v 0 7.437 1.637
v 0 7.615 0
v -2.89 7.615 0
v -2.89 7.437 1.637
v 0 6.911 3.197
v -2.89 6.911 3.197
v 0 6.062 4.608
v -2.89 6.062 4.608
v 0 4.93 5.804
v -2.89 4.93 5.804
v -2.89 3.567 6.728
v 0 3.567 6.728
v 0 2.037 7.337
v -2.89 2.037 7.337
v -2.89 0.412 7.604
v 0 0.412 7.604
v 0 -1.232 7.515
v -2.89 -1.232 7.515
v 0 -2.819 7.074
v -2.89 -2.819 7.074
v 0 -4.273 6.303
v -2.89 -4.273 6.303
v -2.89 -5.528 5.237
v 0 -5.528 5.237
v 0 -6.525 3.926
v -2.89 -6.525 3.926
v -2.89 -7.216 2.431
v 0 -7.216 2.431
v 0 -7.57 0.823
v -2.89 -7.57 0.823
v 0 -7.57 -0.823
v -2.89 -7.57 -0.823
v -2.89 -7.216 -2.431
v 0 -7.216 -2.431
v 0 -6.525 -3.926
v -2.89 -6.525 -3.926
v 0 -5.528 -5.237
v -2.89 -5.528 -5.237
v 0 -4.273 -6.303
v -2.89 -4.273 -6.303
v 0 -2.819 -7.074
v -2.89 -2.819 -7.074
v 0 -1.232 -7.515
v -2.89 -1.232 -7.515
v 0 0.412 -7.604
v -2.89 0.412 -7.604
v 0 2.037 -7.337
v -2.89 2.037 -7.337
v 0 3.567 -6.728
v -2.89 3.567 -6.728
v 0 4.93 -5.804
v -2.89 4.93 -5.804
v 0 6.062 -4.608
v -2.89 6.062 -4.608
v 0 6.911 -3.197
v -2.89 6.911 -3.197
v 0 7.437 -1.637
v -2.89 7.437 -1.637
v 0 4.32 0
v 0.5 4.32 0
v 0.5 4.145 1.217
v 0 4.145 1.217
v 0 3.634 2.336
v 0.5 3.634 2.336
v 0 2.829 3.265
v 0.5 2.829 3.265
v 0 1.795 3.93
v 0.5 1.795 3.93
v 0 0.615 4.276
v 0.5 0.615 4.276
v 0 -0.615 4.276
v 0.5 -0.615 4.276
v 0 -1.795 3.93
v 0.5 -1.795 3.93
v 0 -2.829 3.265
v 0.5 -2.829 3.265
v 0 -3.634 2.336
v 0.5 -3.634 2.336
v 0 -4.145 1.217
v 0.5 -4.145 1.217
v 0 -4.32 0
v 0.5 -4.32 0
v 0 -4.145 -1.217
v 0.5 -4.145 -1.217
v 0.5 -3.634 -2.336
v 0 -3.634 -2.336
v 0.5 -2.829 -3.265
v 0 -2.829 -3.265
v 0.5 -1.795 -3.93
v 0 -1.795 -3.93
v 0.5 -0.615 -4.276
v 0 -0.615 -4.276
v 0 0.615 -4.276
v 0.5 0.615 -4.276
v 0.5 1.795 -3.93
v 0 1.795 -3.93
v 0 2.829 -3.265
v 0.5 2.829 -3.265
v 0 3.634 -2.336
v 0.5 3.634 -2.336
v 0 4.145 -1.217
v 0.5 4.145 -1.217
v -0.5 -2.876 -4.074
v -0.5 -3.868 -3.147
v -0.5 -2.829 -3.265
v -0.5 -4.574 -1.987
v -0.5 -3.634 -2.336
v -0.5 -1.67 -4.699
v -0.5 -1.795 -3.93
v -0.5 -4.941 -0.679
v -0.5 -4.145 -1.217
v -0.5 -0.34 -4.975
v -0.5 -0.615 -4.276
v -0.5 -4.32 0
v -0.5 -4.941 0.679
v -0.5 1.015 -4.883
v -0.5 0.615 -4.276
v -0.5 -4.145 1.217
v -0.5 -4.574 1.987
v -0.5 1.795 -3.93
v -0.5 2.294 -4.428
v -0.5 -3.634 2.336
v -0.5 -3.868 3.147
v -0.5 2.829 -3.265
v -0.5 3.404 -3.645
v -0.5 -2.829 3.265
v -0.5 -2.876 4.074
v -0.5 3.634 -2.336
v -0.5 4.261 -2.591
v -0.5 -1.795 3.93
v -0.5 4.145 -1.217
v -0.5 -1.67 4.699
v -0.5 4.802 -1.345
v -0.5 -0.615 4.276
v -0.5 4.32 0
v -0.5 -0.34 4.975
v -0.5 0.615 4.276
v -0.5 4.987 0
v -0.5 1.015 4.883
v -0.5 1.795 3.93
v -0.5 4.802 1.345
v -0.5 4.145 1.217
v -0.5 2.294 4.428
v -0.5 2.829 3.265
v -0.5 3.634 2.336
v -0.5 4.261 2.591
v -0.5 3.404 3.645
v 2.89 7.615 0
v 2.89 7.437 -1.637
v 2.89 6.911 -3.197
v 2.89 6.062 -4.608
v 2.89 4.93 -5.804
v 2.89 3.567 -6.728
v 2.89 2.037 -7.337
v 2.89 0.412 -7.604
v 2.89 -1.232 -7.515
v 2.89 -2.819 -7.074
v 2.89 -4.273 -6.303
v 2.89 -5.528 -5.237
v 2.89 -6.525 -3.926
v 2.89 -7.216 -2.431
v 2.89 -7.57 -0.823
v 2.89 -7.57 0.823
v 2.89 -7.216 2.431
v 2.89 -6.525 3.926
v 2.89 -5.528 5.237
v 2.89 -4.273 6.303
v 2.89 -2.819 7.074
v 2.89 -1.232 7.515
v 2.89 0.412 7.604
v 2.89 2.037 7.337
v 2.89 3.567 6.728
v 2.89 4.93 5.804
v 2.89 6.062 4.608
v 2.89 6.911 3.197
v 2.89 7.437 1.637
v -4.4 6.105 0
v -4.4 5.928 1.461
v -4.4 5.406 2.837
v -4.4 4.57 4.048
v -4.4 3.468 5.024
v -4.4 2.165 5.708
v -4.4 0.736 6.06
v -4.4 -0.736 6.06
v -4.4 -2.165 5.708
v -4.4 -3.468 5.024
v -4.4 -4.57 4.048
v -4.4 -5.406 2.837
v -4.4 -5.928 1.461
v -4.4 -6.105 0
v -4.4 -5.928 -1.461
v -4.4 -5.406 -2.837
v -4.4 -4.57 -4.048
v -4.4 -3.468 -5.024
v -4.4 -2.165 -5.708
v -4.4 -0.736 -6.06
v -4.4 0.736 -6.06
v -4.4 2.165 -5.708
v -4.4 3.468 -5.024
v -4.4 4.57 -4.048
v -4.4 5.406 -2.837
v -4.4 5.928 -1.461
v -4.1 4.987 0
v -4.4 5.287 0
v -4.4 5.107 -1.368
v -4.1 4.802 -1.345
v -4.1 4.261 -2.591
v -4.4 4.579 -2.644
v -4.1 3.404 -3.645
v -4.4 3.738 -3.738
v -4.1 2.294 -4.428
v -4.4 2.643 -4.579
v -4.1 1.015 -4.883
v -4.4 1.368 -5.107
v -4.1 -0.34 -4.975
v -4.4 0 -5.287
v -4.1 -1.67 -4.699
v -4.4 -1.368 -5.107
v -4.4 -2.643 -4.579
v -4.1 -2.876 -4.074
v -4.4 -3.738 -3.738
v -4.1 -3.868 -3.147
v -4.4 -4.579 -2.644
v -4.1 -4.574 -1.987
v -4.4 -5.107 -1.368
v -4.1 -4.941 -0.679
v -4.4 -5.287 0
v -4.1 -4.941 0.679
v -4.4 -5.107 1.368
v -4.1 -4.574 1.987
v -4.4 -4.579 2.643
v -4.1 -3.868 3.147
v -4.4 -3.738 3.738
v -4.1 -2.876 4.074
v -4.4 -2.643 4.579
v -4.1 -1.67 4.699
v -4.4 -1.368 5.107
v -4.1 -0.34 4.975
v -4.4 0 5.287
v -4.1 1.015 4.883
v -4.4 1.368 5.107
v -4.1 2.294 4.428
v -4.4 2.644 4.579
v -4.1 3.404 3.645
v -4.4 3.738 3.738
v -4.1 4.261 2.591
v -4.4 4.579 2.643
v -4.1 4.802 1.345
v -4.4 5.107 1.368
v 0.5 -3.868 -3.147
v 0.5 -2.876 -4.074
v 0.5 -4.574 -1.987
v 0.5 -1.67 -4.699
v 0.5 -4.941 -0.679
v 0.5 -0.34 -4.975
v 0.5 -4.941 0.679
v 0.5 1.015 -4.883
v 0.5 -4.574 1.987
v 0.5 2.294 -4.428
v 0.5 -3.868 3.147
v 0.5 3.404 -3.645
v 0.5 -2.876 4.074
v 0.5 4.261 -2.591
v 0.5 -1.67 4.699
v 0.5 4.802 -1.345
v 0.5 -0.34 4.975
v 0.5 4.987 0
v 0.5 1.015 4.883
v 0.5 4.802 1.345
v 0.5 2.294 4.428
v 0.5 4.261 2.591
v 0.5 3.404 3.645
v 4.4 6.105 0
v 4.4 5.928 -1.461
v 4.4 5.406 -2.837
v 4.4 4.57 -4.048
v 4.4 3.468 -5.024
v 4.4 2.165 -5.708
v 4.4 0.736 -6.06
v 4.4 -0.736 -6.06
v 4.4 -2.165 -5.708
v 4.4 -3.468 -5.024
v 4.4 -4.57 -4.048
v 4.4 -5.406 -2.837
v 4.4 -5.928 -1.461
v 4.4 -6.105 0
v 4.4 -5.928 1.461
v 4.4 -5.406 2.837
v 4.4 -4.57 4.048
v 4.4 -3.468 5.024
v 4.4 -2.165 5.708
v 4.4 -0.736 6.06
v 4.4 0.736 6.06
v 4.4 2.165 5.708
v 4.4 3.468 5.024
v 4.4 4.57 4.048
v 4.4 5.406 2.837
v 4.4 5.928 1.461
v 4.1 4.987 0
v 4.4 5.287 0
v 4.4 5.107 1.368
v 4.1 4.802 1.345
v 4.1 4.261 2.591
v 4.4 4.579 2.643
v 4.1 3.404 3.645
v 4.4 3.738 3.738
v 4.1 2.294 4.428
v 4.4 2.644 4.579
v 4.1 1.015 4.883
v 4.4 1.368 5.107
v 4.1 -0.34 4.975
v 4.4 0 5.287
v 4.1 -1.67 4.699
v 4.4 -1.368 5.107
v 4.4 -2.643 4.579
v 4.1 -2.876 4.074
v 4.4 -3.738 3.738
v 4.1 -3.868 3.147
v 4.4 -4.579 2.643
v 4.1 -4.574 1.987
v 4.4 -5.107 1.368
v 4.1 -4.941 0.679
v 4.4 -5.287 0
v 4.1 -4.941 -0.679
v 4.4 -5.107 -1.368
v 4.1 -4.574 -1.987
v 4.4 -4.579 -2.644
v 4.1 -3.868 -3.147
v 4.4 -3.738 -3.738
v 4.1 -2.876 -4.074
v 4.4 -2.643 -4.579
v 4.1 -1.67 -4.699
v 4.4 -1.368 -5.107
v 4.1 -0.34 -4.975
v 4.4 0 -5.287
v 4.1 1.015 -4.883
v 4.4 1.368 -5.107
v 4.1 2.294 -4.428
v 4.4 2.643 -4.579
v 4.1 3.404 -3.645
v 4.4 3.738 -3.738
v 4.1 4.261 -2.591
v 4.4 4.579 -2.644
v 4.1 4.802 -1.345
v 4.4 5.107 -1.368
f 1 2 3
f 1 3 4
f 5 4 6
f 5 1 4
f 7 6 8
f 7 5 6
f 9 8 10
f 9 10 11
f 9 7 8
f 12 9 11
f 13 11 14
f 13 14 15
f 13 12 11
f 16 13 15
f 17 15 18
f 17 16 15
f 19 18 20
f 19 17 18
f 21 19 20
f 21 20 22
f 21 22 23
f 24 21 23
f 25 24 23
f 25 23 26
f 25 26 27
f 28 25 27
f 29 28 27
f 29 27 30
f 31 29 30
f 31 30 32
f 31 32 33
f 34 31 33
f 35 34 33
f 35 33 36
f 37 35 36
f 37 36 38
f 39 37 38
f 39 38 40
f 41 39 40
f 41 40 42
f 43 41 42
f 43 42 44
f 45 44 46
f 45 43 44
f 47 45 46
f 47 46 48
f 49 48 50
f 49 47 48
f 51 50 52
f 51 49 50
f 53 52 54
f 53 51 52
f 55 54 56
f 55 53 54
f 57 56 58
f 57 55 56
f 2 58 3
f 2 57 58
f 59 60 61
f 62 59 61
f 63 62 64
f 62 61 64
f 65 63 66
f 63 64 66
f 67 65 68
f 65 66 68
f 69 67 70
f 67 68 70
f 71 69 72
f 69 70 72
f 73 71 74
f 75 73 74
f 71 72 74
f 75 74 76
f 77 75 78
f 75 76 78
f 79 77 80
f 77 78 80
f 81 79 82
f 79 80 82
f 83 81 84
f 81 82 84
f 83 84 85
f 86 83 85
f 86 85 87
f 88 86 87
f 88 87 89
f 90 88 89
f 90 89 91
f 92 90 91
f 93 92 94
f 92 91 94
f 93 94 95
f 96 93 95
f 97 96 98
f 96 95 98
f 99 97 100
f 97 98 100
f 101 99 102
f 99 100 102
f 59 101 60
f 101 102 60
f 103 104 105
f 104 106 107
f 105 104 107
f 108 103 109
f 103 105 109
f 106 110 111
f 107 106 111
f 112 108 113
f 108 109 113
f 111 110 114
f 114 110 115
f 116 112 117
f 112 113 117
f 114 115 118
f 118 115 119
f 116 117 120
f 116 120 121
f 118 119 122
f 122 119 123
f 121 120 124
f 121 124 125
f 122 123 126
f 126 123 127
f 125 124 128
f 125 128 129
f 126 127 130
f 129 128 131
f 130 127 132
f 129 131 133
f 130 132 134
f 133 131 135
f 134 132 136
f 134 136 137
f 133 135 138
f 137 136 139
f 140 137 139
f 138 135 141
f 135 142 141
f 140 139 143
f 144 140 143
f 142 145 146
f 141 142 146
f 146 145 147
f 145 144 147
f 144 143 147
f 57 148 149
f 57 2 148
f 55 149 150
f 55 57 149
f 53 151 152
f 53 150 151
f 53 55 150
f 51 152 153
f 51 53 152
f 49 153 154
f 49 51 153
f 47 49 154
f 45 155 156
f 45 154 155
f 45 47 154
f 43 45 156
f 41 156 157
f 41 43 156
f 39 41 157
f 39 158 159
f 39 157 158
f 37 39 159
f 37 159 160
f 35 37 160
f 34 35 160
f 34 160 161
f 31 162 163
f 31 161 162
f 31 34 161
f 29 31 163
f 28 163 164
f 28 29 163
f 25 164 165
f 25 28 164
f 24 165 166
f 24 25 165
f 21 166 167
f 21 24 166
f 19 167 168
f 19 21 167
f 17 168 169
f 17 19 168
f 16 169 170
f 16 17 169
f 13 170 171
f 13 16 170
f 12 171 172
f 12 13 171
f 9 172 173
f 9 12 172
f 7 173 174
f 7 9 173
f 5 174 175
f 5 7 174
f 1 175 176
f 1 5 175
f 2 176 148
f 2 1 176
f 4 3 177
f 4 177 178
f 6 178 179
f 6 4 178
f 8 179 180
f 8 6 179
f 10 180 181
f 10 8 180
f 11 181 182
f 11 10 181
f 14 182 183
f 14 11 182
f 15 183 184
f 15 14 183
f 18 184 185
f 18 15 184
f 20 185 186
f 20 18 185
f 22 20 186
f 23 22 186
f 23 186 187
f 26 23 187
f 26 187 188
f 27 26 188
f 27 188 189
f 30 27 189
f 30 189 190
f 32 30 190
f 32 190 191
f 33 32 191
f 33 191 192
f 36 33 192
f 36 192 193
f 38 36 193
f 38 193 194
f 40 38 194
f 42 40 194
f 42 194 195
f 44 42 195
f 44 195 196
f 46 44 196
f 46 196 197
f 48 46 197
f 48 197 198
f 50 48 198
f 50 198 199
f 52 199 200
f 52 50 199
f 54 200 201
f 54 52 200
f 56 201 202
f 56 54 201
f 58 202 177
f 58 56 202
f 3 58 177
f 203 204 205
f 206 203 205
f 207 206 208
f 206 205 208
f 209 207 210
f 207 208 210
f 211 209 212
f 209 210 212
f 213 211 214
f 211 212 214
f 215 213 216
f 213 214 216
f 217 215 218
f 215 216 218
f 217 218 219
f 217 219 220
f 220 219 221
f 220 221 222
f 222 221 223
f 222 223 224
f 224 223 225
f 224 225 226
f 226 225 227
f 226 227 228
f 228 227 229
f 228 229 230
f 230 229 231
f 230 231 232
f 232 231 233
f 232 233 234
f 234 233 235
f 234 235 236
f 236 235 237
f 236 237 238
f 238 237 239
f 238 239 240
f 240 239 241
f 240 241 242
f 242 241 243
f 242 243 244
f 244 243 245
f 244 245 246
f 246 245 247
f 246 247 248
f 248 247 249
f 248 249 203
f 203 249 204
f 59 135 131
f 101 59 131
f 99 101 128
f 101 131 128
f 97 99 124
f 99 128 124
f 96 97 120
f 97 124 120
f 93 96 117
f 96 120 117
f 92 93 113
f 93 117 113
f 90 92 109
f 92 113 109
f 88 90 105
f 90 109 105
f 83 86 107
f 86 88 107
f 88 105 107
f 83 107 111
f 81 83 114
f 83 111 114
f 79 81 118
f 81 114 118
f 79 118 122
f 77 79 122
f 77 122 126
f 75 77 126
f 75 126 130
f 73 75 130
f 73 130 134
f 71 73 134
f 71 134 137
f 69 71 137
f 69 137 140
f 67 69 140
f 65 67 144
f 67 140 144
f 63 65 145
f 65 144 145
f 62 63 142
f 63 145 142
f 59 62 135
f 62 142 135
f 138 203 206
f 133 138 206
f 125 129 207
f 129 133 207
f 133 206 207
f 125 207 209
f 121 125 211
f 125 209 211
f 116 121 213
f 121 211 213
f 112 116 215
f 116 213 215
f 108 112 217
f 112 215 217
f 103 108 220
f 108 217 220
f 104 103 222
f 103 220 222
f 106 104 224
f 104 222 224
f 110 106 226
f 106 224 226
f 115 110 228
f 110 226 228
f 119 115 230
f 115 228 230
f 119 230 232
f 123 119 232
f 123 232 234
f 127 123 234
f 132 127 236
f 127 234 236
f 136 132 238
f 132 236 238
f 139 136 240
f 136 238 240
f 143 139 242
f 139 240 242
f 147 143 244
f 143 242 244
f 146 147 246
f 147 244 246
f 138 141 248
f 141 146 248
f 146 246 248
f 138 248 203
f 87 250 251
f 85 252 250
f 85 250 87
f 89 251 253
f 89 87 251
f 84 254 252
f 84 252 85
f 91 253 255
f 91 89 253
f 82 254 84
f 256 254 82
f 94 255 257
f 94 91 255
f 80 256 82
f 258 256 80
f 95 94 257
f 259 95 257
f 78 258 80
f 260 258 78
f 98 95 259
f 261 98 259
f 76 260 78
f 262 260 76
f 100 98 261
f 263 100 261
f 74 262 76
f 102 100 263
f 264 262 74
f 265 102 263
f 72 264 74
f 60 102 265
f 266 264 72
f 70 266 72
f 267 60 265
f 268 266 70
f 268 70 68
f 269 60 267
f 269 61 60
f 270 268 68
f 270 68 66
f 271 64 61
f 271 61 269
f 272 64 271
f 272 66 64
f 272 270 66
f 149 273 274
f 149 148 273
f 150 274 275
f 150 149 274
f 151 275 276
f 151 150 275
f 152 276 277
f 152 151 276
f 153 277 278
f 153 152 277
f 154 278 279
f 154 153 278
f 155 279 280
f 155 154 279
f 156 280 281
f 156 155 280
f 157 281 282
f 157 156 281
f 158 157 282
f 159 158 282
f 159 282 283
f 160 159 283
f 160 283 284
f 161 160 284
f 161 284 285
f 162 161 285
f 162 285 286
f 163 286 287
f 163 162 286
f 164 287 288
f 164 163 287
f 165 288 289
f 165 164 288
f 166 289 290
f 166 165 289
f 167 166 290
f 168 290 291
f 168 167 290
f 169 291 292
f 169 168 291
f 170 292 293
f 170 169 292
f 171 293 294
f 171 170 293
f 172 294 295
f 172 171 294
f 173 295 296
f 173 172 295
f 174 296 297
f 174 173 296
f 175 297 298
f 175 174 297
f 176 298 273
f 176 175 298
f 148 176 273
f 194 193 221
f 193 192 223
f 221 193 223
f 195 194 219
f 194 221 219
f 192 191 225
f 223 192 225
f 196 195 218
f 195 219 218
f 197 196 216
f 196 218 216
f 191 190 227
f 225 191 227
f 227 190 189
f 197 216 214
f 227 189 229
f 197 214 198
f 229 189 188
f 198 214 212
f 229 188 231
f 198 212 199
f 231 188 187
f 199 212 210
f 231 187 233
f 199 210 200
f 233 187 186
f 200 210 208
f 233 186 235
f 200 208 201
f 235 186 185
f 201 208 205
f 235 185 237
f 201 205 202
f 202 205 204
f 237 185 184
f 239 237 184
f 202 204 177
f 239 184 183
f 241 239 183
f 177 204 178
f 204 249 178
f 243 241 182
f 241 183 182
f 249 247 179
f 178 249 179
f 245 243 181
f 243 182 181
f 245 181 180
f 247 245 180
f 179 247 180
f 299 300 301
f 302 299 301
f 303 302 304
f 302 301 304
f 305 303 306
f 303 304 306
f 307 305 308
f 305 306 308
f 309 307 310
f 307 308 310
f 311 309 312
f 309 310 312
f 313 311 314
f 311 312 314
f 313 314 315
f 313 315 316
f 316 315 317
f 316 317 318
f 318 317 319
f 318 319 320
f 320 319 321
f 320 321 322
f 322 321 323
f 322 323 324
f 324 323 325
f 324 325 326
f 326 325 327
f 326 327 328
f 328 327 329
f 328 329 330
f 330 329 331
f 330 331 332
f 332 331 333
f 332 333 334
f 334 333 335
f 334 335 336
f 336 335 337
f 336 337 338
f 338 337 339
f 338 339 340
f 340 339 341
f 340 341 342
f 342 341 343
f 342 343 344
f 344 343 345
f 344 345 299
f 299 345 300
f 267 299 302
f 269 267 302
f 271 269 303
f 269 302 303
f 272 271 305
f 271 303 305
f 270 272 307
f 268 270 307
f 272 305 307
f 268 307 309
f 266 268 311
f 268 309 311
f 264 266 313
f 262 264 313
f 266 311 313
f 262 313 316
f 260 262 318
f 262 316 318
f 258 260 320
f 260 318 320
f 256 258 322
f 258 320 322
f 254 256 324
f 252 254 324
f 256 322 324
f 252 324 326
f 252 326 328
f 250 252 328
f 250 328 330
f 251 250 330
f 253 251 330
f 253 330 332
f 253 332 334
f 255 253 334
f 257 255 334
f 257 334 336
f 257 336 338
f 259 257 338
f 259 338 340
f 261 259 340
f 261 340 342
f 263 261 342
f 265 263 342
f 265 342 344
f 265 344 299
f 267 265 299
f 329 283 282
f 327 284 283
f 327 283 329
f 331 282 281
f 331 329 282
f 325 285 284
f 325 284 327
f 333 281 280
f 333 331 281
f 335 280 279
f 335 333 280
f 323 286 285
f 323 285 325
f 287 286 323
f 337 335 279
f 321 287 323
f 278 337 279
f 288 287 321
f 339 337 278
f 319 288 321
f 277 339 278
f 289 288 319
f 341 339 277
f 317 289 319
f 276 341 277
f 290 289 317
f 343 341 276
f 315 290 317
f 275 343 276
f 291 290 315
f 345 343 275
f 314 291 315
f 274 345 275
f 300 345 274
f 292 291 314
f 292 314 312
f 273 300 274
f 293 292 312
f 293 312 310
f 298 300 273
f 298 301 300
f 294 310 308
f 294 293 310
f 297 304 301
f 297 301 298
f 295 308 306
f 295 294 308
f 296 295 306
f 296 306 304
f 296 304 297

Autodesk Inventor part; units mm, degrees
ref_plane "YZ Plane" through (0, 0, 0) normal (1, 0, 0) x (0, 1, 0)
ref_plane "XZ Plane" through (0, 0, 0) normal (0, 1, 0) x (-1, 0, 0)
ref_plane "XY Plane" through (0, 0, 0) normal (0, 0, 1) x (1, 0, 0)
sketch "Sketch1" plane through (0, 0, 0) normal (0, 0, 1) x (1, 0, 0)
  line L0 (0, 0) -> (5, 0)
  line L1 (0, 0) -> (0, 20) construction
  line L2 (0, 0) -> (20, 0) construction
  line L3 (0, 4.32) -> (0.5, 4.32)
  line L4 (0.5, 4.32) -> (0.5, 4.987)
  line L5 (0.5, 4.987) -> (4.1, 4.987)
  line L6 (4.4, 5.287) -> (4.4, 6.105)
  line L7 (4.4, 6.105) -> (2.89, 7.615)
  line L8 (2.89, 7.615) -> (0, 7.615)
  line L9 (4.1, 4.987) -> (4.4, 5.287)
  line L10 (0, 4.32) -> (-0.5, 4.32)
  line L11 (-0.5, 4.32) -> (-0.5, 4.987)
  line L12 (-0.5, 4.987) -> (-4.1, 4.987)
  line L13 (-4.4, 5.287) -> (-4.4, 6.105)
  line L14 (-4.4, 6.105) -> (-2.89, 7.615)
  line L15 (-2.89, 7.615) -> (0, 7.615)
  line L16 (-4.1, 4.987) -> (-4.4, 5.287)
  point P0 (4.4, 4.987)
  point P1 (-4.4, 4.987)
  dimension "d0" = 5
  dimension "d1" = 20
  dimension "d2" = 90
  dimension "d3" = 8.64
  dimension "d4" = 15.23
  dimension "d5" = 0.5
  dimension "d6" = 3.9
  dimension "d7" = 12.21
  dimension "d8" = 9.974
  dimension "d9" = 135
  dimension "d10" = 0.3
  dimension "d11" = 0.3
  dimension "d12" = 5.78
revolve "Revolution1" add sketch "Sketch1" angle 360 about axis through (0, 0, 0) along (1, 0, 0)
equation "\"d11\" = d10"
properties part number "Micro V Wheel" material "Acetal Resin, Black"
